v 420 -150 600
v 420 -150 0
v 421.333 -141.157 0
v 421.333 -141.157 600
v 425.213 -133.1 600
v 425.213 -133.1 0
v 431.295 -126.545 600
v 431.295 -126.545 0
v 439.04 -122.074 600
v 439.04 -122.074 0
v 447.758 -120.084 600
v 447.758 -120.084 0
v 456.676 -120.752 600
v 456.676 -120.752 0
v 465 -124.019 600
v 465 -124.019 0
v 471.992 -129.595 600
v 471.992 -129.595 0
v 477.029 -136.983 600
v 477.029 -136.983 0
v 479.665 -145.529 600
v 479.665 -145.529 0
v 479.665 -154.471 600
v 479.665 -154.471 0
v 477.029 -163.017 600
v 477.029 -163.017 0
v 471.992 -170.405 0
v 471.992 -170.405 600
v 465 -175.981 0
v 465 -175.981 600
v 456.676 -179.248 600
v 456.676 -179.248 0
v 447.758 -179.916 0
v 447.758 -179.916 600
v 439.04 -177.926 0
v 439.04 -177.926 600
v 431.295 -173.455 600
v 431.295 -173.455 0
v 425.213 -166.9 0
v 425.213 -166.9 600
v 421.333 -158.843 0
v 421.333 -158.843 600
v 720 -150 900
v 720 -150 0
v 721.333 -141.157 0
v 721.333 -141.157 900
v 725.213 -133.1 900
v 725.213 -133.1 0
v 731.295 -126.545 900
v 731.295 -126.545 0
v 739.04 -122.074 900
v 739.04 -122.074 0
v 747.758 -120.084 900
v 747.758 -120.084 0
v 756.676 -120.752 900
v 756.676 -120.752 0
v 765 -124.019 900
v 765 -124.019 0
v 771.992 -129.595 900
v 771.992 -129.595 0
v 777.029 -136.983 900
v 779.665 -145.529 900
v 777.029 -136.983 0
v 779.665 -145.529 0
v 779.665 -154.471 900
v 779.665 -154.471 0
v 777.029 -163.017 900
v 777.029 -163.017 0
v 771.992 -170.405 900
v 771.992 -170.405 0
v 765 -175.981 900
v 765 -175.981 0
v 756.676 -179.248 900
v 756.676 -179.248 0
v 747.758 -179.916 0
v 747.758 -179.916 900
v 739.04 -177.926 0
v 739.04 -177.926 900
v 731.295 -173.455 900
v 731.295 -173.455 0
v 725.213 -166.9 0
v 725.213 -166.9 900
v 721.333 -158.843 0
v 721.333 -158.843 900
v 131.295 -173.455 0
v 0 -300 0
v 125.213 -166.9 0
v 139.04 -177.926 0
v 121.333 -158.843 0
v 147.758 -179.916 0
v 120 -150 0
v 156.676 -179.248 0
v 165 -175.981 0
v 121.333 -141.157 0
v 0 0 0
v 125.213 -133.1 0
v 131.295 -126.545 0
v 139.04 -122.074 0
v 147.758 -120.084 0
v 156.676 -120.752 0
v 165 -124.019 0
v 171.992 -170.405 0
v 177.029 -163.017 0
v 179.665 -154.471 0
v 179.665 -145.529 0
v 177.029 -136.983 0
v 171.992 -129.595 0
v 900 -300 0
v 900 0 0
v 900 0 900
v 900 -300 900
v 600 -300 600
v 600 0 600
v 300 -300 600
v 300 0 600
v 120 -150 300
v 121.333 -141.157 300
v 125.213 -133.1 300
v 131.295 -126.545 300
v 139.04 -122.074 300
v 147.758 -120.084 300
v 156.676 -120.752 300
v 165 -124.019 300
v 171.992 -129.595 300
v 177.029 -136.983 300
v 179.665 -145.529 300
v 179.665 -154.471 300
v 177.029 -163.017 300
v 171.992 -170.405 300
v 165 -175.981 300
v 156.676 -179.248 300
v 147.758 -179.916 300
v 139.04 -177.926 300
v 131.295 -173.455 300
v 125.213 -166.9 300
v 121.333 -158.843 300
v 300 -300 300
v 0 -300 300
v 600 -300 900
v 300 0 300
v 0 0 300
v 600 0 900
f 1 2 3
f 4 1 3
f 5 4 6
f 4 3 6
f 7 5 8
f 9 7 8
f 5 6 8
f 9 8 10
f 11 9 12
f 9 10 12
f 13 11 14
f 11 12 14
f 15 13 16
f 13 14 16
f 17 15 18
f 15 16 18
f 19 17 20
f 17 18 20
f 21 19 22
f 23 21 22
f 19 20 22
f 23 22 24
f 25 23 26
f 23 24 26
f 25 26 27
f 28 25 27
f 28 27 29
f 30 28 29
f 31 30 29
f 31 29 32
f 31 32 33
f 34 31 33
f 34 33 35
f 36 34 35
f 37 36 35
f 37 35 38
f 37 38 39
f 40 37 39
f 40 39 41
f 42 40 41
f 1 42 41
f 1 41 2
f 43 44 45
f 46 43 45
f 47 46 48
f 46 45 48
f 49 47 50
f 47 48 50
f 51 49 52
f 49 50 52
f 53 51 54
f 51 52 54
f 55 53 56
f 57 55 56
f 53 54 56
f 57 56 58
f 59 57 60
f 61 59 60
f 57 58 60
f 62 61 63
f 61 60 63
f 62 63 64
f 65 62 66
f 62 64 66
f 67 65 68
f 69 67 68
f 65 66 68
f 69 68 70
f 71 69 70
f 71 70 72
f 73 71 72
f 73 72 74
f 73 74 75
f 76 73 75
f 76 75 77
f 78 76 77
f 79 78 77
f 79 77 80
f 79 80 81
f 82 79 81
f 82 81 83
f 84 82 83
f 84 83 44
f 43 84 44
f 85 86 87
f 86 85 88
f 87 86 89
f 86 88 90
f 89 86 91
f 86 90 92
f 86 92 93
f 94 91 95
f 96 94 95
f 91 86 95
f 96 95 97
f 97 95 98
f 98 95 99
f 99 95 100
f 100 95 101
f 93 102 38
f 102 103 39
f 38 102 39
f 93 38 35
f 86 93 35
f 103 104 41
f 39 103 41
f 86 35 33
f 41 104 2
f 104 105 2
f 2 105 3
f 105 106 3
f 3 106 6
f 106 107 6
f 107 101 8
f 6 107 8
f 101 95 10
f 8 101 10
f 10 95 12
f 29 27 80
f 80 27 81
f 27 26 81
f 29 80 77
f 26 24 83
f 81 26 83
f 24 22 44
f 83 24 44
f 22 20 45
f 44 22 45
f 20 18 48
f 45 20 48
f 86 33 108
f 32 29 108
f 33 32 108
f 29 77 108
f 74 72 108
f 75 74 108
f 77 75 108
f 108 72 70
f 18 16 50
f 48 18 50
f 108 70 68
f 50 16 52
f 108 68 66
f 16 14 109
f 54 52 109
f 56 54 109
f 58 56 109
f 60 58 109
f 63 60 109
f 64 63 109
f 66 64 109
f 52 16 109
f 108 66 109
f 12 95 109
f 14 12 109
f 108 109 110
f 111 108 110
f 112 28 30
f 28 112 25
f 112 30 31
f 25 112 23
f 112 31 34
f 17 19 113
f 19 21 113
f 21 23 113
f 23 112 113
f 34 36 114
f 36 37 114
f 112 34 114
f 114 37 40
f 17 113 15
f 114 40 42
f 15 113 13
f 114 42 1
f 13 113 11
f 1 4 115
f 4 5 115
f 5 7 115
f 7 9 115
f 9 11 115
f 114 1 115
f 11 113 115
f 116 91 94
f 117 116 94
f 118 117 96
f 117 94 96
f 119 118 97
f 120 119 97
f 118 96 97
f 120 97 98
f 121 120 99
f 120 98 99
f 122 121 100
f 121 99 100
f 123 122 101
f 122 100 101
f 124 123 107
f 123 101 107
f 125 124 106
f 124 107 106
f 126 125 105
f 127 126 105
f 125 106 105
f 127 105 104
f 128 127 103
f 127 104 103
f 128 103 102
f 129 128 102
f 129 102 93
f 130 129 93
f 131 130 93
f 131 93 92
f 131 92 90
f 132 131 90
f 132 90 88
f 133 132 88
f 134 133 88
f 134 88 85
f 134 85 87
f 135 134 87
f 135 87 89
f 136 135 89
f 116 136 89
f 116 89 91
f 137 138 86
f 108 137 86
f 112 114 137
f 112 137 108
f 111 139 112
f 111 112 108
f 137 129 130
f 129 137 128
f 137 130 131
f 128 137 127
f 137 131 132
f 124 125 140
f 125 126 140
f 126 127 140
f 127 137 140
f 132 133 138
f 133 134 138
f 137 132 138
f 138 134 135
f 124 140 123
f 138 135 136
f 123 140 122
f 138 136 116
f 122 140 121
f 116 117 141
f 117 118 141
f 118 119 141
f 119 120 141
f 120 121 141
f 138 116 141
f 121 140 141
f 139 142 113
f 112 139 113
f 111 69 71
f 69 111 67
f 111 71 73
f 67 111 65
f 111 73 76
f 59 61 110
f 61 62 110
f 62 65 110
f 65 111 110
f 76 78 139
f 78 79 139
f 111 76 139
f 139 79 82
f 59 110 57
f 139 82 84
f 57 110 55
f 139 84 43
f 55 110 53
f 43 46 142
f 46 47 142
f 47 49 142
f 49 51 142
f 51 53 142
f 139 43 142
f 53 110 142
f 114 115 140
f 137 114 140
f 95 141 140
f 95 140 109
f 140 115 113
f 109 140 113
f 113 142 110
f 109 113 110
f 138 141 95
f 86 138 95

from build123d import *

# Parameters (mm, degrees)
F1_DEPTH = 300
F3_D     = 60
F6_D     = 60
F7_D     = 60


with BuildPart() as f1:
    # F0 (on Front) → F1 (new body)
    with BuildSketch(Plane.XZ):
        Polygon((0, 300), (0, 0), (900, 0), (900, 900), (600, 900), (600, 600), (300, 600), (300, 300), align=None)
    extrude(amount=F1_DEPTH)

    # F3 (through all)
    with Locations(Plane.XY.offset(900)):
        with Locations((750, -150)):
            Hole(F3_D / 2)

    # F6 (through all)
    with Locations(Plane.XY.offset(300)):
        with Locations((150, -150)):
            Hole(F6_D / 2)

    # F7 (through all)
    with Locations(Plane.XY.offset(600)):
        with Locations((450, -150)):
            Hole(F7_D / 2)


solid = f1.part
